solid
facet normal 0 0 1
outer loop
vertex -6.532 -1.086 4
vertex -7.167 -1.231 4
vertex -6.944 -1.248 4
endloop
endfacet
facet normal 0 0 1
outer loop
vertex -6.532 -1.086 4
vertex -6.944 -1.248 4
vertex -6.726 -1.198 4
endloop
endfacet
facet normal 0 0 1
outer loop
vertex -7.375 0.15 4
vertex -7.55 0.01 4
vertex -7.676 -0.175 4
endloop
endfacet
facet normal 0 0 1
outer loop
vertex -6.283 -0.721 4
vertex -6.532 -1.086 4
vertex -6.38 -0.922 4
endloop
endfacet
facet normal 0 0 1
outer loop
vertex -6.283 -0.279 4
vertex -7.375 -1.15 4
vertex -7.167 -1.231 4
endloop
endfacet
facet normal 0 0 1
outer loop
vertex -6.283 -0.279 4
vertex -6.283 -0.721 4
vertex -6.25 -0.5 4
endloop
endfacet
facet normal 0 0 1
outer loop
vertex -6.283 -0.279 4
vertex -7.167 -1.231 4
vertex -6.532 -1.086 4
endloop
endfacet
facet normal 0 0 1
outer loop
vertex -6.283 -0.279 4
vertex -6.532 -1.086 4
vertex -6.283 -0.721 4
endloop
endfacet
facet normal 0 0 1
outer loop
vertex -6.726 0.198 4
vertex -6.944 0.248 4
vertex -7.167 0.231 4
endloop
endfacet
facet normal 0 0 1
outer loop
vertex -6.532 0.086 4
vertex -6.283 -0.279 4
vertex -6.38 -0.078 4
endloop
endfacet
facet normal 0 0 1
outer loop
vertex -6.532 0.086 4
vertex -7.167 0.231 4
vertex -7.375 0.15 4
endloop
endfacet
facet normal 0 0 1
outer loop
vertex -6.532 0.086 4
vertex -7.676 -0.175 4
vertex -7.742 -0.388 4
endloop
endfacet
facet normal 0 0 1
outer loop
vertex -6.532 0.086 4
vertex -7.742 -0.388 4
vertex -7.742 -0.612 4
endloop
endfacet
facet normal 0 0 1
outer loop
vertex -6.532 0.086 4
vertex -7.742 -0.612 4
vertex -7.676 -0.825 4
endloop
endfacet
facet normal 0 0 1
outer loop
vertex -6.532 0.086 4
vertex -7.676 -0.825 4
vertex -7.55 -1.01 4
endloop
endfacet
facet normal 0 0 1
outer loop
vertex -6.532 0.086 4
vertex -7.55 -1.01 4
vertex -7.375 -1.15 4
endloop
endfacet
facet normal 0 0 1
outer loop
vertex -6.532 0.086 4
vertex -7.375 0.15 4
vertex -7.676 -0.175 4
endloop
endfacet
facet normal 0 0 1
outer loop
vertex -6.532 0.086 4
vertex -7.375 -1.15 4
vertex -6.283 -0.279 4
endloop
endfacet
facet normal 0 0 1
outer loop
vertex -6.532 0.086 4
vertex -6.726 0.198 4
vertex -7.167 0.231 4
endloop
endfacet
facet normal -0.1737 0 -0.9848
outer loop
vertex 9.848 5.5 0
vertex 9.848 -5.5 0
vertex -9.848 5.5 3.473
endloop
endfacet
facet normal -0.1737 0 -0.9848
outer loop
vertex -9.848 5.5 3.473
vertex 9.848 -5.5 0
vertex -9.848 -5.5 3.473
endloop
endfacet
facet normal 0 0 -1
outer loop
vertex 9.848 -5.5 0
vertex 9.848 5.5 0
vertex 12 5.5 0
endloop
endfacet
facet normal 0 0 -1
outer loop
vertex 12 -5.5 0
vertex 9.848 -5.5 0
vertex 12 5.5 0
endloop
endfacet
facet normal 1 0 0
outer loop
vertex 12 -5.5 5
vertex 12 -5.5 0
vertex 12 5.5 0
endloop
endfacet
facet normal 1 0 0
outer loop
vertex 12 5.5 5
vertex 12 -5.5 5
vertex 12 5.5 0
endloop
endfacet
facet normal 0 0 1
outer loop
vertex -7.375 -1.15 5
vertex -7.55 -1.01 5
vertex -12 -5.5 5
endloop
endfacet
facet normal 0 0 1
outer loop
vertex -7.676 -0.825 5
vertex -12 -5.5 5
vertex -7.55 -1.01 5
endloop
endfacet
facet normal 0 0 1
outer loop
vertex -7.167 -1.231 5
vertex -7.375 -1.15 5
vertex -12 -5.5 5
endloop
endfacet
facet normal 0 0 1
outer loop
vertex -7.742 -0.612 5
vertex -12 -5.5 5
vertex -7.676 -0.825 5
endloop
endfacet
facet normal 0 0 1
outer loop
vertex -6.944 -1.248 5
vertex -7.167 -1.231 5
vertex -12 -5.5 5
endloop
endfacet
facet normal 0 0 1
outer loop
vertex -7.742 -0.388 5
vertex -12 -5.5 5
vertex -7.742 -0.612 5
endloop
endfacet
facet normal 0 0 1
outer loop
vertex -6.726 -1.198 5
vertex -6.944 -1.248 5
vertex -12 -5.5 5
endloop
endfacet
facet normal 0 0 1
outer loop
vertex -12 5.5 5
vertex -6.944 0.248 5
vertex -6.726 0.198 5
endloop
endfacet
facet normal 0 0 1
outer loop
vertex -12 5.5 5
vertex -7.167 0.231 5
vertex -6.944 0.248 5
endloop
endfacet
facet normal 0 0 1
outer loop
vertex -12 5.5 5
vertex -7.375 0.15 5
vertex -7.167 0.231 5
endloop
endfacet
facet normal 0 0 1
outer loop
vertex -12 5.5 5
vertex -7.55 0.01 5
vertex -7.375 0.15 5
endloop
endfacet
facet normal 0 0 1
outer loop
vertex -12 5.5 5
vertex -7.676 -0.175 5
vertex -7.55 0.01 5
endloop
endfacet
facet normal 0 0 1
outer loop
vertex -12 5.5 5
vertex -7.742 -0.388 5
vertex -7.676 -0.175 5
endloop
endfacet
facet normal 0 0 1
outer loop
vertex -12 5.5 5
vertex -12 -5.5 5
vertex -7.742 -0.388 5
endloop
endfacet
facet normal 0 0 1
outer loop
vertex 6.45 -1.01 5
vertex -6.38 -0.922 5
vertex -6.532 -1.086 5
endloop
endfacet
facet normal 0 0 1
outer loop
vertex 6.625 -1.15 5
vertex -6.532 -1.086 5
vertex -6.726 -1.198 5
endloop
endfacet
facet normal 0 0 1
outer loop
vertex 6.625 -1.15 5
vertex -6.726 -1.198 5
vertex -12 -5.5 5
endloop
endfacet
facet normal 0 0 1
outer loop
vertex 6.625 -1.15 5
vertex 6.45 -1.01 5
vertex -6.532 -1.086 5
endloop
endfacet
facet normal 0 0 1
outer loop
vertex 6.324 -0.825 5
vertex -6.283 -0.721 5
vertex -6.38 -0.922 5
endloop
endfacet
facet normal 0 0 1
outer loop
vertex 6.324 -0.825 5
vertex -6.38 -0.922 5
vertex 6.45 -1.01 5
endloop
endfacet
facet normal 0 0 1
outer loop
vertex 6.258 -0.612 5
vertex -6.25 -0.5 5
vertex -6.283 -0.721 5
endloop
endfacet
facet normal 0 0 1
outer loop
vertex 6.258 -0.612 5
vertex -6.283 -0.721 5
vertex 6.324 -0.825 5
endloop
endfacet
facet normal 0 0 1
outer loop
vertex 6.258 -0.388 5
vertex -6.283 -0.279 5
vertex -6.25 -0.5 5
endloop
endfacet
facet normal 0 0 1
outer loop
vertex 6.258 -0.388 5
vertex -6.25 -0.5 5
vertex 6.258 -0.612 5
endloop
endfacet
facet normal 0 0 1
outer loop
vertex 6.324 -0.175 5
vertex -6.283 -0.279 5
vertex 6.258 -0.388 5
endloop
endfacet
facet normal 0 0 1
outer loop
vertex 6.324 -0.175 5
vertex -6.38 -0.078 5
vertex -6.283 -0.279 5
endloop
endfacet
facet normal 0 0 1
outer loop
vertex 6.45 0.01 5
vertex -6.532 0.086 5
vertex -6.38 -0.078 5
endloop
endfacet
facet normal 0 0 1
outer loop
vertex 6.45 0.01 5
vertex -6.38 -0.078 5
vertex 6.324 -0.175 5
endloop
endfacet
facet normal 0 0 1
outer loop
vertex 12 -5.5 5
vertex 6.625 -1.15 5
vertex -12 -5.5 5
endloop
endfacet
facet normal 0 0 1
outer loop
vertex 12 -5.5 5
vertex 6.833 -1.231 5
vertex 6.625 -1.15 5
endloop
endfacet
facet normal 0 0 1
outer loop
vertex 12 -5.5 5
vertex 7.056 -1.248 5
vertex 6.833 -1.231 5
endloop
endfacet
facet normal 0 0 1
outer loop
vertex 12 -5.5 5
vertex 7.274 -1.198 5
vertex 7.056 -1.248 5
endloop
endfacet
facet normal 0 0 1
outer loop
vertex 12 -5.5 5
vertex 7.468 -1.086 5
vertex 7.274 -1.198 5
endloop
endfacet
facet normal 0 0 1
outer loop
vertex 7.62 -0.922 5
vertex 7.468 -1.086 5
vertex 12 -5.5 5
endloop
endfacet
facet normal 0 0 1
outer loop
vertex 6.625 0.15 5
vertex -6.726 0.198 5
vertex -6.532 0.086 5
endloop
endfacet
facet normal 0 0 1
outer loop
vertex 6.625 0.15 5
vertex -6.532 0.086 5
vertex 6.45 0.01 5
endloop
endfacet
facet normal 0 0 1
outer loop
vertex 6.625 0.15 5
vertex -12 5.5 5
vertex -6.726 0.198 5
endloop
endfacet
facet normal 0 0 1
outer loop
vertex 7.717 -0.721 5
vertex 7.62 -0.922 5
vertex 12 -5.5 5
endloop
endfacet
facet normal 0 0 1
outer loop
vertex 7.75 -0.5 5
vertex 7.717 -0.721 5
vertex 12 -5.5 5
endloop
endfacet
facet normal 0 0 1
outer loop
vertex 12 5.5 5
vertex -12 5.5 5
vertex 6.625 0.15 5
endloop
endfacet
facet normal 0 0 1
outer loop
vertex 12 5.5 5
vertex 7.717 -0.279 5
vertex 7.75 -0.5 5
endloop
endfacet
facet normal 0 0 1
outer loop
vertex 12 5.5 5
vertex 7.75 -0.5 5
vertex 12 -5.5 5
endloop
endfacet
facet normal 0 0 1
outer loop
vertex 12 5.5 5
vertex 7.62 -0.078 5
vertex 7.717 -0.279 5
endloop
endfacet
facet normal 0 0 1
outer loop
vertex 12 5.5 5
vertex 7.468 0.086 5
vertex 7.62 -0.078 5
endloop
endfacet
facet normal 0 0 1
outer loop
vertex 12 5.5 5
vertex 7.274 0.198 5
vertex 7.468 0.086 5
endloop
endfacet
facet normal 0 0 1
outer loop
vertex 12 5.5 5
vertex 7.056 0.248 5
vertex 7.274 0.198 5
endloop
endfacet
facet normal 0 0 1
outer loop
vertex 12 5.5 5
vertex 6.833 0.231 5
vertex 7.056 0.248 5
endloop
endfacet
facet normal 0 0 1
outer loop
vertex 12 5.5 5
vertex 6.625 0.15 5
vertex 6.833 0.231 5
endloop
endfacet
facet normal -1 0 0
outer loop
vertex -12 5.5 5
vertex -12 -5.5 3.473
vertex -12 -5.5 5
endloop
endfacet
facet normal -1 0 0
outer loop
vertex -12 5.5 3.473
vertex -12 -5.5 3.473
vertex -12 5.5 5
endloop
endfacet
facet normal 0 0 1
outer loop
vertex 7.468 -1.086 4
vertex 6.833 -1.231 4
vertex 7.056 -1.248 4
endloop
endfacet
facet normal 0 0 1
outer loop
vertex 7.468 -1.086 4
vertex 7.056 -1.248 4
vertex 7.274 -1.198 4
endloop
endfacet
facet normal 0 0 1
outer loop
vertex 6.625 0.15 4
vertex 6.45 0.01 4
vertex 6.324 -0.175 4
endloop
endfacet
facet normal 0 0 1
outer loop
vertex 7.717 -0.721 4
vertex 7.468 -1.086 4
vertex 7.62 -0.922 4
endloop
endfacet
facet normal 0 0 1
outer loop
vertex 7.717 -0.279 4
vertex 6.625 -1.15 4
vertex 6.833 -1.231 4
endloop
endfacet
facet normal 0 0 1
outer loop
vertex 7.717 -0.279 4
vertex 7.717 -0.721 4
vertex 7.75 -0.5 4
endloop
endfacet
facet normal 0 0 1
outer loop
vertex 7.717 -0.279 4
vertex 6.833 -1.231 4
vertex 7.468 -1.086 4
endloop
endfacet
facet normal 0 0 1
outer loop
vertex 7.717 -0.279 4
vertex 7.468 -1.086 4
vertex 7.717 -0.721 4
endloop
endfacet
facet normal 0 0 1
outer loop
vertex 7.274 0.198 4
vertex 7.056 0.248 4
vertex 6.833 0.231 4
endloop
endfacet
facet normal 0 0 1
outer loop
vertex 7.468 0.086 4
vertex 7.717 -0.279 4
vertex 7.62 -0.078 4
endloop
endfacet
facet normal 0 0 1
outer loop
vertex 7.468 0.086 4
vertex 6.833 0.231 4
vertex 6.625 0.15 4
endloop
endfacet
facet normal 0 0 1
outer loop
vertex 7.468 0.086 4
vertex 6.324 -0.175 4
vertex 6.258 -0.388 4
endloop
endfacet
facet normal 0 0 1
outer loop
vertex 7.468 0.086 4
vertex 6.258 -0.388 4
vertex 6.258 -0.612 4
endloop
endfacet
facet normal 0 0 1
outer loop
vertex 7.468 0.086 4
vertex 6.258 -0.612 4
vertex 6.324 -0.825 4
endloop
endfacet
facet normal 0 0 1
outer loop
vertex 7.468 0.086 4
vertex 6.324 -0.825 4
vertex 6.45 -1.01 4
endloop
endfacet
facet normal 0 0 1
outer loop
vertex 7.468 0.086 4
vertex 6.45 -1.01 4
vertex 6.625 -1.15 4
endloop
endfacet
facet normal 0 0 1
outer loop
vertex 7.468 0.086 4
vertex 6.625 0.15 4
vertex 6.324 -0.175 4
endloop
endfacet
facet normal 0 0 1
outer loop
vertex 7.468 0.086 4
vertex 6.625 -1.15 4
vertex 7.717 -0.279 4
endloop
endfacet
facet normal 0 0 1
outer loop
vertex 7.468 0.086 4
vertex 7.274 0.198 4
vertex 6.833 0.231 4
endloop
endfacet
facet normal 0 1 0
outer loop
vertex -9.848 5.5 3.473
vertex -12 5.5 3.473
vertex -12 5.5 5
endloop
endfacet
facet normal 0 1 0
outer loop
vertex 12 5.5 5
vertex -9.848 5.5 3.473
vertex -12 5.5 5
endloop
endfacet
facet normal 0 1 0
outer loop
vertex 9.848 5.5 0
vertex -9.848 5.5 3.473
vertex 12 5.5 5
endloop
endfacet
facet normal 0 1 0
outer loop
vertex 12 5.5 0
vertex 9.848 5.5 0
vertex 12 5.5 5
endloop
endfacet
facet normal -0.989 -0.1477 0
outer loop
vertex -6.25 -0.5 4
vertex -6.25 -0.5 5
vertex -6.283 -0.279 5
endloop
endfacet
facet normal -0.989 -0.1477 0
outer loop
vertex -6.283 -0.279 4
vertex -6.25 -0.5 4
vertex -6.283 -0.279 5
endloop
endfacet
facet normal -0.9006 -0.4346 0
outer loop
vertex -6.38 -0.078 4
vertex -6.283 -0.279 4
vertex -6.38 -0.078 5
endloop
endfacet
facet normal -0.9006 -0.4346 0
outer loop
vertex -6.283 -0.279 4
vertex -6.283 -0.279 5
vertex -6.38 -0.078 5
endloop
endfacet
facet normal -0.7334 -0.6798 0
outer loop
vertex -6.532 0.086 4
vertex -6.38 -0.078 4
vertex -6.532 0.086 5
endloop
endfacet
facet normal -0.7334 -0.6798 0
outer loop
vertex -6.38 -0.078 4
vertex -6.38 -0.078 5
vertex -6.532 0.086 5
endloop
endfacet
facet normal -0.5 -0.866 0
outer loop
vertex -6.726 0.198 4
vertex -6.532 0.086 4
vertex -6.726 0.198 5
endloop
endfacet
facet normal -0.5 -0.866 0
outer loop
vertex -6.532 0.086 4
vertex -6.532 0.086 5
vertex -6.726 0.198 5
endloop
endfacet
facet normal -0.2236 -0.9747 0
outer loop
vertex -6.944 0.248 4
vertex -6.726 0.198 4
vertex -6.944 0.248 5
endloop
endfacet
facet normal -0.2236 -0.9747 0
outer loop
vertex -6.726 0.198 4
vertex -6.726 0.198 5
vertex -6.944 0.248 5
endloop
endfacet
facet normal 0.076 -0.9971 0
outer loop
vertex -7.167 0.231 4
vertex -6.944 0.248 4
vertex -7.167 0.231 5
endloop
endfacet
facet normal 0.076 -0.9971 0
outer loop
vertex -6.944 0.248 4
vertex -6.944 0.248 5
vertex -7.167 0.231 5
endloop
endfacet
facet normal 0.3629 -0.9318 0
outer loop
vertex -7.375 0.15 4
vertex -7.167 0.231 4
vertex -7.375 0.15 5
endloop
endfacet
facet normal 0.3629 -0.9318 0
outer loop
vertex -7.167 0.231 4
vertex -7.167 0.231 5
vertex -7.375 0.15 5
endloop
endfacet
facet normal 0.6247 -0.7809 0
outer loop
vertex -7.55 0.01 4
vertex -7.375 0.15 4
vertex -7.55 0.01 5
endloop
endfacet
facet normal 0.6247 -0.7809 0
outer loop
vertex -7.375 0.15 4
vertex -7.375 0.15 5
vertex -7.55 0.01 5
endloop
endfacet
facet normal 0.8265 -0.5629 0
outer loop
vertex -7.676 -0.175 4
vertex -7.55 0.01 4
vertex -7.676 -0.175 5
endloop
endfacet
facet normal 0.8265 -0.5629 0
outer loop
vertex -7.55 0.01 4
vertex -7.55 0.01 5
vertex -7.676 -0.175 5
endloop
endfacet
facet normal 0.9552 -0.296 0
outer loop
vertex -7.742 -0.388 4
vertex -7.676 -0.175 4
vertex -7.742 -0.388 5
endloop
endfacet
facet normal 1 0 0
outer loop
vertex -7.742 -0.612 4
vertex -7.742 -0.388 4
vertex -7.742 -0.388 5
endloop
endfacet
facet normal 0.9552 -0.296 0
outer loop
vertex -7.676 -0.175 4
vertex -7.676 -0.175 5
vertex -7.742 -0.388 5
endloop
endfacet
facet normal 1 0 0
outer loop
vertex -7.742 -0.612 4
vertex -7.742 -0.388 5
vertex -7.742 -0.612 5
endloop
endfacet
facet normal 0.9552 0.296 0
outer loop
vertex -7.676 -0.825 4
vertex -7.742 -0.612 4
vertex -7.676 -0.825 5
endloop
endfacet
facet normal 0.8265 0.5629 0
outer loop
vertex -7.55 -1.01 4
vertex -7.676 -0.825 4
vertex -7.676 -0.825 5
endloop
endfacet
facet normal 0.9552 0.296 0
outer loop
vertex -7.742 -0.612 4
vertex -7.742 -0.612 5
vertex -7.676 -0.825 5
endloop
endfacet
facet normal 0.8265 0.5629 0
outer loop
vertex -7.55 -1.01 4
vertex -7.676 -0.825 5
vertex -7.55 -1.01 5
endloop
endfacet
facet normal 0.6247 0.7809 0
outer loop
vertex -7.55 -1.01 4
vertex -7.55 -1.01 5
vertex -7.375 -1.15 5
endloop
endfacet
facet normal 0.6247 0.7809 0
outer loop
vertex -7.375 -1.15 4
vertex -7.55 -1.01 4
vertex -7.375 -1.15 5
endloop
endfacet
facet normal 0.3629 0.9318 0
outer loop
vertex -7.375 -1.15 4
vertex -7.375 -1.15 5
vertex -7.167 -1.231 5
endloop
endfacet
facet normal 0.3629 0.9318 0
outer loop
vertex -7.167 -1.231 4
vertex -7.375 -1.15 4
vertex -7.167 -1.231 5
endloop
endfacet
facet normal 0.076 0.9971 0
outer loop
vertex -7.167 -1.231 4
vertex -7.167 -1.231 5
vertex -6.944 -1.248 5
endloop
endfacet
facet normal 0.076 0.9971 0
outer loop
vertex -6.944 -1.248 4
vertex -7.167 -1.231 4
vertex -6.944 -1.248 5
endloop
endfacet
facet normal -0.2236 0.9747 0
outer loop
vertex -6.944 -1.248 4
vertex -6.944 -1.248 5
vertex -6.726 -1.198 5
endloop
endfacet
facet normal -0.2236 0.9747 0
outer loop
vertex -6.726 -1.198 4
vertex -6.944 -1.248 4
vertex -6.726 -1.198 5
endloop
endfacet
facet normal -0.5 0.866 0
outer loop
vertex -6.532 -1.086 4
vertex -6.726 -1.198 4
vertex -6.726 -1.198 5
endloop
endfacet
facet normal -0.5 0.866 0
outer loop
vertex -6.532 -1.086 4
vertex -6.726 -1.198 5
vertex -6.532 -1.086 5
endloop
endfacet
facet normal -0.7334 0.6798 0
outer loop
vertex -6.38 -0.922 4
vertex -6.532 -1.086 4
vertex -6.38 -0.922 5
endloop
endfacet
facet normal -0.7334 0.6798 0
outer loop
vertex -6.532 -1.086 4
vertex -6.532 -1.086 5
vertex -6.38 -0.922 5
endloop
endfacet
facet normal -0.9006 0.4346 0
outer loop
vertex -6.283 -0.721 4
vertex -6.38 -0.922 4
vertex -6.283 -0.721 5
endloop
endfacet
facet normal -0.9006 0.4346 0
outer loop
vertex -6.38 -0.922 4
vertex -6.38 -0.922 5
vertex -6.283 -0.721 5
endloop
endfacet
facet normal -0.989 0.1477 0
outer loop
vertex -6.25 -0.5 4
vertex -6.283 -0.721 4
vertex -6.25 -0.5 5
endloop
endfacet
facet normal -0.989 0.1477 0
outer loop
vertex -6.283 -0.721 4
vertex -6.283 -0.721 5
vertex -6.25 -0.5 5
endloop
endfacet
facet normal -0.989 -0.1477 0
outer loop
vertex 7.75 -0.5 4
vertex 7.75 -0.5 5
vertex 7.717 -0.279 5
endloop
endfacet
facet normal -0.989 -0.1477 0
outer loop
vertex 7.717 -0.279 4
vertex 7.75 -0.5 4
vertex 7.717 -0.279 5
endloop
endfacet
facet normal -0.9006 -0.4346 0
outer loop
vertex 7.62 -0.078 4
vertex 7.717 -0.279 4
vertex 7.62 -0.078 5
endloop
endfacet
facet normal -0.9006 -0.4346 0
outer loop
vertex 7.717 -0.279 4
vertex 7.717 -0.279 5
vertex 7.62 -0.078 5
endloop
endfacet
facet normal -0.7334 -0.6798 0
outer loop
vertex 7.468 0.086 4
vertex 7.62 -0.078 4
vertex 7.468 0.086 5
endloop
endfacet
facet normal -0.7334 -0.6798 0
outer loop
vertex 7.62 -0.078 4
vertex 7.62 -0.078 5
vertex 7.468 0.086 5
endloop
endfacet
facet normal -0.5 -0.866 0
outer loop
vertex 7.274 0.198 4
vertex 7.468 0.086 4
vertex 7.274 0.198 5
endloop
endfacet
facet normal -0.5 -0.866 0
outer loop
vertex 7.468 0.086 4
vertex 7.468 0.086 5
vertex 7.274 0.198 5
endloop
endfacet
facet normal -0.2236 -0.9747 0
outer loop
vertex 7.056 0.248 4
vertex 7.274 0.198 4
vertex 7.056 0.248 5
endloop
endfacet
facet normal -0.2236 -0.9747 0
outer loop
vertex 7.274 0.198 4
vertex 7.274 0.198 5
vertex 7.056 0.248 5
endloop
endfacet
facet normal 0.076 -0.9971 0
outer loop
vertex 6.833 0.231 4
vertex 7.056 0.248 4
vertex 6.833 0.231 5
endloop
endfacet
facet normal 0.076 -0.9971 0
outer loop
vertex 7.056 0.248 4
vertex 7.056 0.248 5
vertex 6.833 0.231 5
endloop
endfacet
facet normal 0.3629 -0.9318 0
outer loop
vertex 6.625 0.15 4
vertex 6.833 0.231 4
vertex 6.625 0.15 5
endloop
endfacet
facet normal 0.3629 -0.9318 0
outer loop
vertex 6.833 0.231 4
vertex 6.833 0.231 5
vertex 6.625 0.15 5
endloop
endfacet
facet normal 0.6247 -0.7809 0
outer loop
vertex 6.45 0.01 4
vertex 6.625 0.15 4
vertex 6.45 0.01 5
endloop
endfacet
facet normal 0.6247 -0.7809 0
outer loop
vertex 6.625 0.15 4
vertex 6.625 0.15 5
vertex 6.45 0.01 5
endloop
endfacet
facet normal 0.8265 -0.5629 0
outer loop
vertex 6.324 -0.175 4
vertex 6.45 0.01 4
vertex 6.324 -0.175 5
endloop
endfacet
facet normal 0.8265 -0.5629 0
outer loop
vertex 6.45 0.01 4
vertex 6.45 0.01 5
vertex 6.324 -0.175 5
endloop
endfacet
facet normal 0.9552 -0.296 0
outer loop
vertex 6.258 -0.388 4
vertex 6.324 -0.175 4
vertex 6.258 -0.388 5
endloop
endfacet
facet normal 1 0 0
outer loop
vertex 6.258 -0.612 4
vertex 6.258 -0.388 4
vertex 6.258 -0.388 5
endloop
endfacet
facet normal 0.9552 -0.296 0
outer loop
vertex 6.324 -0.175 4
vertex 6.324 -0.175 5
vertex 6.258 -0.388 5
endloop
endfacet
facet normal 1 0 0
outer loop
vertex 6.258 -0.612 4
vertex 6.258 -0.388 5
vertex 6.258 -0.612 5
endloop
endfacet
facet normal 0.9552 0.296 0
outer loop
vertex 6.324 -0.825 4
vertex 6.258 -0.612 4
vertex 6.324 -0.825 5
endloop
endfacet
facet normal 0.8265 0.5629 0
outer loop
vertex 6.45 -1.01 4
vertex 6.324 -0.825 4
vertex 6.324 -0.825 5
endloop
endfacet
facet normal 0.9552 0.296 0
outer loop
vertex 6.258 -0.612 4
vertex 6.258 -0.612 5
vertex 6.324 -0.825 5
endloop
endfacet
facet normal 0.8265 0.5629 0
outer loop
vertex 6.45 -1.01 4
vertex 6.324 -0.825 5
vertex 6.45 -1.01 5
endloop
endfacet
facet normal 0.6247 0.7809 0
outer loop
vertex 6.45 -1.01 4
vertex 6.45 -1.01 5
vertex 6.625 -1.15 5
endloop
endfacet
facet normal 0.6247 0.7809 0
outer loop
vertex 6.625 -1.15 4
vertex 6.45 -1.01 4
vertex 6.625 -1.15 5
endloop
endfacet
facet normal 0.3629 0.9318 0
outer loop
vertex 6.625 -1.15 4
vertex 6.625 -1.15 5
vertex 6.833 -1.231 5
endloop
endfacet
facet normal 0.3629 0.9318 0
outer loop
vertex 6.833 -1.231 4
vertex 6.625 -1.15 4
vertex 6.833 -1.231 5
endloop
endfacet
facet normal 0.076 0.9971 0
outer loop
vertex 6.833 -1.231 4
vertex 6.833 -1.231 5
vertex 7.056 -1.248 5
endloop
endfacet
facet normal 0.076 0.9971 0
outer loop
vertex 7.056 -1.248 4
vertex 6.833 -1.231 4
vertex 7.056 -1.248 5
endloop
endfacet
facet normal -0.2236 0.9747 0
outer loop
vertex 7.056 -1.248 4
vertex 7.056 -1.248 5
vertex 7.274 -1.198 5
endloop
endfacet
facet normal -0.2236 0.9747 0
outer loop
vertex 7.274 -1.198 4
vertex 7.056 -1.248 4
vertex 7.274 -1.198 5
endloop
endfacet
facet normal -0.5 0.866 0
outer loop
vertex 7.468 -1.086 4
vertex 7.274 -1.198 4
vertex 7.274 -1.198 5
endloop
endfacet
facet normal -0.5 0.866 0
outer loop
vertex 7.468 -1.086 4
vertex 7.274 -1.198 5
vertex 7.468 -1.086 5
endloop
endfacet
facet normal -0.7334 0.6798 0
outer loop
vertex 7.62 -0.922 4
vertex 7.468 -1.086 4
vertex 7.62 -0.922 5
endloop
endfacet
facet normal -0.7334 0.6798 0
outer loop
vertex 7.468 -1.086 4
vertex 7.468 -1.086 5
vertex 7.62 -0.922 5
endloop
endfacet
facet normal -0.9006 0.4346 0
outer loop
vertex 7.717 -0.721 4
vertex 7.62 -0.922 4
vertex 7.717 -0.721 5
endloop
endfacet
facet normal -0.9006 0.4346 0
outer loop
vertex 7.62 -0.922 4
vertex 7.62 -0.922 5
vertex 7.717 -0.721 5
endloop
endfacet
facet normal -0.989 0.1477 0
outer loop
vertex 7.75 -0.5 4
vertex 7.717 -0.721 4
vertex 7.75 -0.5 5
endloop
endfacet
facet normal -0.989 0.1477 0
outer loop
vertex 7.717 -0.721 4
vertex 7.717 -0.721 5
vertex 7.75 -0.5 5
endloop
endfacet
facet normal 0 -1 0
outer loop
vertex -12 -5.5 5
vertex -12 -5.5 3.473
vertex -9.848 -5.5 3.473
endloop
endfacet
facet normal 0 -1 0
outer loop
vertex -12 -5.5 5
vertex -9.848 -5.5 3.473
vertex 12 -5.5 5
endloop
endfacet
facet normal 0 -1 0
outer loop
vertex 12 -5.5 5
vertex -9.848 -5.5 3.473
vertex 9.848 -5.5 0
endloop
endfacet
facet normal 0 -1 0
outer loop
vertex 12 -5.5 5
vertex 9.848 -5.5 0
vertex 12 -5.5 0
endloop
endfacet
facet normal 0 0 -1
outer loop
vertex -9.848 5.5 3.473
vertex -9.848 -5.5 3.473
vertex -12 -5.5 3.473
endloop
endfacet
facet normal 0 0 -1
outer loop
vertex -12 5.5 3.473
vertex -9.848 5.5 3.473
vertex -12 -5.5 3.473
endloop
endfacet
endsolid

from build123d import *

# Parameters (mm, degrees)
F0_W     = 24
F0_H     = 11
F1_DEPTH = 5
F2_R     = 0.75
F3_DEPTH = 1
F5_DEPTH = 11.001


with BuildPart() as f1:
    # F0 (on Top) → F1 (new body)
    with BuildSketch(Plane.XY):
        Rectangle(F0_W, F0_H)
    extrude(amount=F1_DEPTH)

    # F2 (on face) → F3 (cut)
    with BuildSketch(Plane.XY.offset(5)):
        with Locations((-7, -0.5)):
            Circle(F2_R)
        with Locations((7, -0.5)):
            Circle(F2_R)
    extrude(amount=-F3_DEPTH, mode=Mode.SUBTRACT)

    # F4 (on face) → F5 (cut, through all)
    with BuildSketch(Plane.XZ.offset(5.5)):
        Polygon((-12, 0), (9.848078, 0), (-9.848078, 3.472964), (-12, 3.472964), align=None)
    extrude(amount=-F5_DEPTH, mode=Mode.SUBTRACT)


solid = f1.part
